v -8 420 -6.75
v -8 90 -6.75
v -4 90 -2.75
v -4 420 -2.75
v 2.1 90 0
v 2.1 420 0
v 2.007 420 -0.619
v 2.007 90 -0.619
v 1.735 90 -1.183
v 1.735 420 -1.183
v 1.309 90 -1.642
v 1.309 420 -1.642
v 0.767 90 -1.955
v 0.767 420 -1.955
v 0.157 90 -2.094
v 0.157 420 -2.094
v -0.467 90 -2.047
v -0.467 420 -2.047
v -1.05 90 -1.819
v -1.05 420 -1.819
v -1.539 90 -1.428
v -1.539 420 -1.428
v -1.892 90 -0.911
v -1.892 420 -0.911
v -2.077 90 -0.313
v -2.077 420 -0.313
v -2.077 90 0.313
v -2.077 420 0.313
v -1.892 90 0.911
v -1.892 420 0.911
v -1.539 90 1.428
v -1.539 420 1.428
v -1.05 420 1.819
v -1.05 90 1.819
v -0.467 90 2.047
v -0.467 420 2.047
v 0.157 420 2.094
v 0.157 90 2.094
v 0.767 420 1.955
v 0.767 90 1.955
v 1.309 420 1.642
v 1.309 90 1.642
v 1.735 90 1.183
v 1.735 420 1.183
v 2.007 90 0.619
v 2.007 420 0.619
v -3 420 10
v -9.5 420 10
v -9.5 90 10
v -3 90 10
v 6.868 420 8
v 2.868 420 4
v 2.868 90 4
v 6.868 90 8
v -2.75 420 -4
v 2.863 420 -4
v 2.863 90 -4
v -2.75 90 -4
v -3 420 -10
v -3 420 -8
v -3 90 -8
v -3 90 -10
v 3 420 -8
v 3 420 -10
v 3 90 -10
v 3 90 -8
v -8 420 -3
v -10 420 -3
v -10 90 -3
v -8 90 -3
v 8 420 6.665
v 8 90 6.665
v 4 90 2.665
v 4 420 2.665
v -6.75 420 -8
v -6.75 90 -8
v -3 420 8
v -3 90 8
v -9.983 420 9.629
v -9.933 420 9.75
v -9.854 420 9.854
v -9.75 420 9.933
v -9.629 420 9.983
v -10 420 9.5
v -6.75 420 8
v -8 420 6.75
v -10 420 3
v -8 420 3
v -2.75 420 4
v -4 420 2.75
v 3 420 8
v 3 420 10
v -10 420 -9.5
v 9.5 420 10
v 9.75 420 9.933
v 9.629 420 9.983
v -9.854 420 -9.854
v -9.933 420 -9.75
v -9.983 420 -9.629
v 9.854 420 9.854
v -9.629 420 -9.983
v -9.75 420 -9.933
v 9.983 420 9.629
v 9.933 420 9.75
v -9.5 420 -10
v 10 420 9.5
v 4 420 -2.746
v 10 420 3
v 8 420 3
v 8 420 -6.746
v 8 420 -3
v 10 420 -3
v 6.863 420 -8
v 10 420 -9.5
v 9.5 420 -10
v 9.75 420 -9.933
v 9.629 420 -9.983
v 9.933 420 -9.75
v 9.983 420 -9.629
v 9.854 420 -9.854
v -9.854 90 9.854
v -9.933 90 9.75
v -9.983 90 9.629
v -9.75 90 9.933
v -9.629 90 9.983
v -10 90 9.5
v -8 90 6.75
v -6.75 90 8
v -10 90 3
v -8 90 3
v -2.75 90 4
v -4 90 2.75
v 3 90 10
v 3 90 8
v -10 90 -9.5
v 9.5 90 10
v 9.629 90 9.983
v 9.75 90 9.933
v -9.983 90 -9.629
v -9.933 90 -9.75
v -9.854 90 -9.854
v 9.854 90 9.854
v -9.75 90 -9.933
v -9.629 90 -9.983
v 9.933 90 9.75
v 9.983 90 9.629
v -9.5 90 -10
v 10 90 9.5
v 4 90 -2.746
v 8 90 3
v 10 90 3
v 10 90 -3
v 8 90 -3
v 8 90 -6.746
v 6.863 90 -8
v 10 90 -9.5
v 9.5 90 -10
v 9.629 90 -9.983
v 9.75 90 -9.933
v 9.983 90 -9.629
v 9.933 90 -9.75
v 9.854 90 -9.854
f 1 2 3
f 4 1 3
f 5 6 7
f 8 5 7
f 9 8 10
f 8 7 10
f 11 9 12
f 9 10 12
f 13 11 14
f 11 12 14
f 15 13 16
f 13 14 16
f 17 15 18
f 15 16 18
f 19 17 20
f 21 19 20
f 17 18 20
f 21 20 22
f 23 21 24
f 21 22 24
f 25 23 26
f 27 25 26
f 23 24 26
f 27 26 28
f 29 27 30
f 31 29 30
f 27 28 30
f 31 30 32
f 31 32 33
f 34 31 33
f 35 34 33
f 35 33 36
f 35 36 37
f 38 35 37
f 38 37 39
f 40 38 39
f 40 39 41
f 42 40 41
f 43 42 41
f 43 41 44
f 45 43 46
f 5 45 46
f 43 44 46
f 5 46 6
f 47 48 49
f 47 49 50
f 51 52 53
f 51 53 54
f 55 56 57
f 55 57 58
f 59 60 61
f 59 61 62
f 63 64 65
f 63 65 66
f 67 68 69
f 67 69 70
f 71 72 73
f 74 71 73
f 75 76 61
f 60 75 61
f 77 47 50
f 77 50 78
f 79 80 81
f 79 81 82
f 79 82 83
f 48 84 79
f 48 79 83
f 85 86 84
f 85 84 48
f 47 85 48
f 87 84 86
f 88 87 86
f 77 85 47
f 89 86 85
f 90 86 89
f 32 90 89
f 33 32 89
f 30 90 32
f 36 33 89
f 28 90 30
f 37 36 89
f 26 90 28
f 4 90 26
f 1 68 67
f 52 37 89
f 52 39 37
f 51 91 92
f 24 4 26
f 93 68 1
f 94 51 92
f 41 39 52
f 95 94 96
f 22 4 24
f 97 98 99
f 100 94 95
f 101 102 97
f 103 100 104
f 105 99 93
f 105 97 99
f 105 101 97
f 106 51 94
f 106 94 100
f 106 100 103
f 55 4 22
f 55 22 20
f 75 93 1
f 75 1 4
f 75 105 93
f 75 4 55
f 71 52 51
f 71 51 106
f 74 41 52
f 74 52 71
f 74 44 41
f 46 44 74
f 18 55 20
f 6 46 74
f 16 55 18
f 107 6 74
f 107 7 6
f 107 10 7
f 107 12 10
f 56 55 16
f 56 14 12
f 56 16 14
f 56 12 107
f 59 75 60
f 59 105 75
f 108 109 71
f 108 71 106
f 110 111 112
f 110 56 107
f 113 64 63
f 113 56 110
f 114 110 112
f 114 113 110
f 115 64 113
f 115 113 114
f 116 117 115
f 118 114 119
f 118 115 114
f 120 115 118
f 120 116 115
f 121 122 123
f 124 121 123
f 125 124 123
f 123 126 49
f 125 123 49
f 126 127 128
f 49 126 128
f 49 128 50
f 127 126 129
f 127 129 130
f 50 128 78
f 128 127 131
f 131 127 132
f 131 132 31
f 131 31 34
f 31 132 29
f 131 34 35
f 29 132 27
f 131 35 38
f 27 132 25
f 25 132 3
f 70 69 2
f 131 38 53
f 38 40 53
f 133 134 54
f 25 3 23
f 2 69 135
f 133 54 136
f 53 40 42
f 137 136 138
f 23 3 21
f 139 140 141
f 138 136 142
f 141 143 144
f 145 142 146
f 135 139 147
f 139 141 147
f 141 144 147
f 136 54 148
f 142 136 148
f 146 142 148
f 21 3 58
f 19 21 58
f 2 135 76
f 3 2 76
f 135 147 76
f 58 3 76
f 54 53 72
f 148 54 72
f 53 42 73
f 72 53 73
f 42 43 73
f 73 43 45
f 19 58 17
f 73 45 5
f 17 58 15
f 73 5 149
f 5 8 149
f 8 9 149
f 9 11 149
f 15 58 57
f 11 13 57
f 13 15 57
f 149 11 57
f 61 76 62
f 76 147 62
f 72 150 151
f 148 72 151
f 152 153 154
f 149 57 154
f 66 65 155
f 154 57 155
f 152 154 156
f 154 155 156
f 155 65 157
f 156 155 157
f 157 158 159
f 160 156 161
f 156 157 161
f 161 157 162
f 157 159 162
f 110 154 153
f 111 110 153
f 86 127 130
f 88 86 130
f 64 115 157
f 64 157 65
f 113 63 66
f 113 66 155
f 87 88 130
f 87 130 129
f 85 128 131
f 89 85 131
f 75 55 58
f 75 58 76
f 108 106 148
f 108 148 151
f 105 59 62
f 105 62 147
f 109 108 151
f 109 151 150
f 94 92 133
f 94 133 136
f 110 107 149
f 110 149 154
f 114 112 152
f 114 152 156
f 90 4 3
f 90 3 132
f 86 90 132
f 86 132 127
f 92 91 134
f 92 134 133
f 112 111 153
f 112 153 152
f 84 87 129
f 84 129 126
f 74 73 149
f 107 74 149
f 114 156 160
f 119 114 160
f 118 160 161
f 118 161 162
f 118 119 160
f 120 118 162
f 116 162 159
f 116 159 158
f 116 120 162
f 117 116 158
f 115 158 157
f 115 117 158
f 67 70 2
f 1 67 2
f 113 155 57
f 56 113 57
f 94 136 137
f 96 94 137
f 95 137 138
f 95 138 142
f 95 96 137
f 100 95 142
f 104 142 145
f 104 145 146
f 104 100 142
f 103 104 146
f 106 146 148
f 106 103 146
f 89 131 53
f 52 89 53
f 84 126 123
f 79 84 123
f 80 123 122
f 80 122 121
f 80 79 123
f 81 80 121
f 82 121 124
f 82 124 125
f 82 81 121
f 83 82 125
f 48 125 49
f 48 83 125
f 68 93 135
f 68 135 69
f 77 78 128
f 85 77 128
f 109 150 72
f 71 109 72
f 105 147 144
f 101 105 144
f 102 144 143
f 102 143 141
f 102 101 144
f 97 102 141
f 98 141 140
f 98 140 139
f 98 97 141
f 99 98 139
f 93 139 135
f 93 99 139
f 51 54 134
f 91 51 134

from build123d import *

# Parameters (mm, degrees)
SKETCH1_R           = 2.1
BOSS_EXTRUDE1_DEPTH = 330


with BuildPart() as part:
    # Sketch1 → Boss-Extrude1 (new body)
    with BuildSketch(Plane(origin=(0, 420, 0), x_dir=(1, 0, 0), z_dir=(0, 1, 0))):
        with BuildLine():
            Line((4, 2.746364236), (8, 6.746364236))
            Line((8, 6.746364236), (8, 3))
            Line((8, 3), (10, 3))
            Line((10, 3), (10, 9.5))
            ThreePointArc((10, 9.5), (9.853553391, 9.853553391), (9.5, 10))
            Line((9.5, 10), (3, 10))
            Line((3, 10), (3, 8))
            Line((3, 8), (6.863334179, 8))
            Line((6.863334179, 8), (2.863334179, 4))
            Line((2.863334179, 4), (-2.75, 4))
            Line((-2.75, 4), (-6.75, 8))
            Line((-6.75, 8), (-3, 8))
            Line((-3, 8), (-3, 10))
            Line((-3, 10), (-9.5, 10))
            ThreePointArc((-9.5, 10), (-9.853553391, 9.853553391), (-10, 9.5))
            Line((-10, 9.5), (-10, 3))
            Line((-10, 3), (-8, 3))
            Line((-8, 3), (-8, 6.75))
            Line((-8, 6.75), (-4, 2.75))
            Line((-4, 2.75), (-4, -2.75))
            Line((-4, -2.75), (-8, -6.75))
            Line((-8, -6.75), (-8, -3))
            Line((-8, -3), (-10, -3))
            Line((-10, -3), (-10, -9.5))
            ThreePointArc((-10, -9.5), (-9.853553391, -9.853553391), (-9.5, -10))
            Line((-9.5, -10), (-3, -10))
            Line((-3, -10), (-3, -8))
            Line((-3, -8), (-6.75, -8))
            Line((-6.75, -8), (-2.75, -4))
            Line((-2.75, -4), (2.868469119, -4))
            Line((2.868469119, -4), (6.868469119, -8))
            Line((6.868469119, -8), (3, -8))
            Line((3, -8), (3, -10))
            Line((3, -10), (9.5, -10))
            ThreePointArc((9.5, -10), (9.853553391, -9.853553391), (10, -9.5))
            Line((10, -9.5), (10, -3))
            Line((10, -3), (8, -3))
            Line((8, -3), (8, -6.665189266))
            Line((8, -6.665189266), (4, -2.665189266))
            Line((4, -2.665189266), (4, 2.746364236))
        make_face()
        Circle(SKETCH1_R, mode=Mode.SUBTRACT)
    extrude(amount=-BOSS_EXTRUDE1_DEPTH)


solid = part.part
